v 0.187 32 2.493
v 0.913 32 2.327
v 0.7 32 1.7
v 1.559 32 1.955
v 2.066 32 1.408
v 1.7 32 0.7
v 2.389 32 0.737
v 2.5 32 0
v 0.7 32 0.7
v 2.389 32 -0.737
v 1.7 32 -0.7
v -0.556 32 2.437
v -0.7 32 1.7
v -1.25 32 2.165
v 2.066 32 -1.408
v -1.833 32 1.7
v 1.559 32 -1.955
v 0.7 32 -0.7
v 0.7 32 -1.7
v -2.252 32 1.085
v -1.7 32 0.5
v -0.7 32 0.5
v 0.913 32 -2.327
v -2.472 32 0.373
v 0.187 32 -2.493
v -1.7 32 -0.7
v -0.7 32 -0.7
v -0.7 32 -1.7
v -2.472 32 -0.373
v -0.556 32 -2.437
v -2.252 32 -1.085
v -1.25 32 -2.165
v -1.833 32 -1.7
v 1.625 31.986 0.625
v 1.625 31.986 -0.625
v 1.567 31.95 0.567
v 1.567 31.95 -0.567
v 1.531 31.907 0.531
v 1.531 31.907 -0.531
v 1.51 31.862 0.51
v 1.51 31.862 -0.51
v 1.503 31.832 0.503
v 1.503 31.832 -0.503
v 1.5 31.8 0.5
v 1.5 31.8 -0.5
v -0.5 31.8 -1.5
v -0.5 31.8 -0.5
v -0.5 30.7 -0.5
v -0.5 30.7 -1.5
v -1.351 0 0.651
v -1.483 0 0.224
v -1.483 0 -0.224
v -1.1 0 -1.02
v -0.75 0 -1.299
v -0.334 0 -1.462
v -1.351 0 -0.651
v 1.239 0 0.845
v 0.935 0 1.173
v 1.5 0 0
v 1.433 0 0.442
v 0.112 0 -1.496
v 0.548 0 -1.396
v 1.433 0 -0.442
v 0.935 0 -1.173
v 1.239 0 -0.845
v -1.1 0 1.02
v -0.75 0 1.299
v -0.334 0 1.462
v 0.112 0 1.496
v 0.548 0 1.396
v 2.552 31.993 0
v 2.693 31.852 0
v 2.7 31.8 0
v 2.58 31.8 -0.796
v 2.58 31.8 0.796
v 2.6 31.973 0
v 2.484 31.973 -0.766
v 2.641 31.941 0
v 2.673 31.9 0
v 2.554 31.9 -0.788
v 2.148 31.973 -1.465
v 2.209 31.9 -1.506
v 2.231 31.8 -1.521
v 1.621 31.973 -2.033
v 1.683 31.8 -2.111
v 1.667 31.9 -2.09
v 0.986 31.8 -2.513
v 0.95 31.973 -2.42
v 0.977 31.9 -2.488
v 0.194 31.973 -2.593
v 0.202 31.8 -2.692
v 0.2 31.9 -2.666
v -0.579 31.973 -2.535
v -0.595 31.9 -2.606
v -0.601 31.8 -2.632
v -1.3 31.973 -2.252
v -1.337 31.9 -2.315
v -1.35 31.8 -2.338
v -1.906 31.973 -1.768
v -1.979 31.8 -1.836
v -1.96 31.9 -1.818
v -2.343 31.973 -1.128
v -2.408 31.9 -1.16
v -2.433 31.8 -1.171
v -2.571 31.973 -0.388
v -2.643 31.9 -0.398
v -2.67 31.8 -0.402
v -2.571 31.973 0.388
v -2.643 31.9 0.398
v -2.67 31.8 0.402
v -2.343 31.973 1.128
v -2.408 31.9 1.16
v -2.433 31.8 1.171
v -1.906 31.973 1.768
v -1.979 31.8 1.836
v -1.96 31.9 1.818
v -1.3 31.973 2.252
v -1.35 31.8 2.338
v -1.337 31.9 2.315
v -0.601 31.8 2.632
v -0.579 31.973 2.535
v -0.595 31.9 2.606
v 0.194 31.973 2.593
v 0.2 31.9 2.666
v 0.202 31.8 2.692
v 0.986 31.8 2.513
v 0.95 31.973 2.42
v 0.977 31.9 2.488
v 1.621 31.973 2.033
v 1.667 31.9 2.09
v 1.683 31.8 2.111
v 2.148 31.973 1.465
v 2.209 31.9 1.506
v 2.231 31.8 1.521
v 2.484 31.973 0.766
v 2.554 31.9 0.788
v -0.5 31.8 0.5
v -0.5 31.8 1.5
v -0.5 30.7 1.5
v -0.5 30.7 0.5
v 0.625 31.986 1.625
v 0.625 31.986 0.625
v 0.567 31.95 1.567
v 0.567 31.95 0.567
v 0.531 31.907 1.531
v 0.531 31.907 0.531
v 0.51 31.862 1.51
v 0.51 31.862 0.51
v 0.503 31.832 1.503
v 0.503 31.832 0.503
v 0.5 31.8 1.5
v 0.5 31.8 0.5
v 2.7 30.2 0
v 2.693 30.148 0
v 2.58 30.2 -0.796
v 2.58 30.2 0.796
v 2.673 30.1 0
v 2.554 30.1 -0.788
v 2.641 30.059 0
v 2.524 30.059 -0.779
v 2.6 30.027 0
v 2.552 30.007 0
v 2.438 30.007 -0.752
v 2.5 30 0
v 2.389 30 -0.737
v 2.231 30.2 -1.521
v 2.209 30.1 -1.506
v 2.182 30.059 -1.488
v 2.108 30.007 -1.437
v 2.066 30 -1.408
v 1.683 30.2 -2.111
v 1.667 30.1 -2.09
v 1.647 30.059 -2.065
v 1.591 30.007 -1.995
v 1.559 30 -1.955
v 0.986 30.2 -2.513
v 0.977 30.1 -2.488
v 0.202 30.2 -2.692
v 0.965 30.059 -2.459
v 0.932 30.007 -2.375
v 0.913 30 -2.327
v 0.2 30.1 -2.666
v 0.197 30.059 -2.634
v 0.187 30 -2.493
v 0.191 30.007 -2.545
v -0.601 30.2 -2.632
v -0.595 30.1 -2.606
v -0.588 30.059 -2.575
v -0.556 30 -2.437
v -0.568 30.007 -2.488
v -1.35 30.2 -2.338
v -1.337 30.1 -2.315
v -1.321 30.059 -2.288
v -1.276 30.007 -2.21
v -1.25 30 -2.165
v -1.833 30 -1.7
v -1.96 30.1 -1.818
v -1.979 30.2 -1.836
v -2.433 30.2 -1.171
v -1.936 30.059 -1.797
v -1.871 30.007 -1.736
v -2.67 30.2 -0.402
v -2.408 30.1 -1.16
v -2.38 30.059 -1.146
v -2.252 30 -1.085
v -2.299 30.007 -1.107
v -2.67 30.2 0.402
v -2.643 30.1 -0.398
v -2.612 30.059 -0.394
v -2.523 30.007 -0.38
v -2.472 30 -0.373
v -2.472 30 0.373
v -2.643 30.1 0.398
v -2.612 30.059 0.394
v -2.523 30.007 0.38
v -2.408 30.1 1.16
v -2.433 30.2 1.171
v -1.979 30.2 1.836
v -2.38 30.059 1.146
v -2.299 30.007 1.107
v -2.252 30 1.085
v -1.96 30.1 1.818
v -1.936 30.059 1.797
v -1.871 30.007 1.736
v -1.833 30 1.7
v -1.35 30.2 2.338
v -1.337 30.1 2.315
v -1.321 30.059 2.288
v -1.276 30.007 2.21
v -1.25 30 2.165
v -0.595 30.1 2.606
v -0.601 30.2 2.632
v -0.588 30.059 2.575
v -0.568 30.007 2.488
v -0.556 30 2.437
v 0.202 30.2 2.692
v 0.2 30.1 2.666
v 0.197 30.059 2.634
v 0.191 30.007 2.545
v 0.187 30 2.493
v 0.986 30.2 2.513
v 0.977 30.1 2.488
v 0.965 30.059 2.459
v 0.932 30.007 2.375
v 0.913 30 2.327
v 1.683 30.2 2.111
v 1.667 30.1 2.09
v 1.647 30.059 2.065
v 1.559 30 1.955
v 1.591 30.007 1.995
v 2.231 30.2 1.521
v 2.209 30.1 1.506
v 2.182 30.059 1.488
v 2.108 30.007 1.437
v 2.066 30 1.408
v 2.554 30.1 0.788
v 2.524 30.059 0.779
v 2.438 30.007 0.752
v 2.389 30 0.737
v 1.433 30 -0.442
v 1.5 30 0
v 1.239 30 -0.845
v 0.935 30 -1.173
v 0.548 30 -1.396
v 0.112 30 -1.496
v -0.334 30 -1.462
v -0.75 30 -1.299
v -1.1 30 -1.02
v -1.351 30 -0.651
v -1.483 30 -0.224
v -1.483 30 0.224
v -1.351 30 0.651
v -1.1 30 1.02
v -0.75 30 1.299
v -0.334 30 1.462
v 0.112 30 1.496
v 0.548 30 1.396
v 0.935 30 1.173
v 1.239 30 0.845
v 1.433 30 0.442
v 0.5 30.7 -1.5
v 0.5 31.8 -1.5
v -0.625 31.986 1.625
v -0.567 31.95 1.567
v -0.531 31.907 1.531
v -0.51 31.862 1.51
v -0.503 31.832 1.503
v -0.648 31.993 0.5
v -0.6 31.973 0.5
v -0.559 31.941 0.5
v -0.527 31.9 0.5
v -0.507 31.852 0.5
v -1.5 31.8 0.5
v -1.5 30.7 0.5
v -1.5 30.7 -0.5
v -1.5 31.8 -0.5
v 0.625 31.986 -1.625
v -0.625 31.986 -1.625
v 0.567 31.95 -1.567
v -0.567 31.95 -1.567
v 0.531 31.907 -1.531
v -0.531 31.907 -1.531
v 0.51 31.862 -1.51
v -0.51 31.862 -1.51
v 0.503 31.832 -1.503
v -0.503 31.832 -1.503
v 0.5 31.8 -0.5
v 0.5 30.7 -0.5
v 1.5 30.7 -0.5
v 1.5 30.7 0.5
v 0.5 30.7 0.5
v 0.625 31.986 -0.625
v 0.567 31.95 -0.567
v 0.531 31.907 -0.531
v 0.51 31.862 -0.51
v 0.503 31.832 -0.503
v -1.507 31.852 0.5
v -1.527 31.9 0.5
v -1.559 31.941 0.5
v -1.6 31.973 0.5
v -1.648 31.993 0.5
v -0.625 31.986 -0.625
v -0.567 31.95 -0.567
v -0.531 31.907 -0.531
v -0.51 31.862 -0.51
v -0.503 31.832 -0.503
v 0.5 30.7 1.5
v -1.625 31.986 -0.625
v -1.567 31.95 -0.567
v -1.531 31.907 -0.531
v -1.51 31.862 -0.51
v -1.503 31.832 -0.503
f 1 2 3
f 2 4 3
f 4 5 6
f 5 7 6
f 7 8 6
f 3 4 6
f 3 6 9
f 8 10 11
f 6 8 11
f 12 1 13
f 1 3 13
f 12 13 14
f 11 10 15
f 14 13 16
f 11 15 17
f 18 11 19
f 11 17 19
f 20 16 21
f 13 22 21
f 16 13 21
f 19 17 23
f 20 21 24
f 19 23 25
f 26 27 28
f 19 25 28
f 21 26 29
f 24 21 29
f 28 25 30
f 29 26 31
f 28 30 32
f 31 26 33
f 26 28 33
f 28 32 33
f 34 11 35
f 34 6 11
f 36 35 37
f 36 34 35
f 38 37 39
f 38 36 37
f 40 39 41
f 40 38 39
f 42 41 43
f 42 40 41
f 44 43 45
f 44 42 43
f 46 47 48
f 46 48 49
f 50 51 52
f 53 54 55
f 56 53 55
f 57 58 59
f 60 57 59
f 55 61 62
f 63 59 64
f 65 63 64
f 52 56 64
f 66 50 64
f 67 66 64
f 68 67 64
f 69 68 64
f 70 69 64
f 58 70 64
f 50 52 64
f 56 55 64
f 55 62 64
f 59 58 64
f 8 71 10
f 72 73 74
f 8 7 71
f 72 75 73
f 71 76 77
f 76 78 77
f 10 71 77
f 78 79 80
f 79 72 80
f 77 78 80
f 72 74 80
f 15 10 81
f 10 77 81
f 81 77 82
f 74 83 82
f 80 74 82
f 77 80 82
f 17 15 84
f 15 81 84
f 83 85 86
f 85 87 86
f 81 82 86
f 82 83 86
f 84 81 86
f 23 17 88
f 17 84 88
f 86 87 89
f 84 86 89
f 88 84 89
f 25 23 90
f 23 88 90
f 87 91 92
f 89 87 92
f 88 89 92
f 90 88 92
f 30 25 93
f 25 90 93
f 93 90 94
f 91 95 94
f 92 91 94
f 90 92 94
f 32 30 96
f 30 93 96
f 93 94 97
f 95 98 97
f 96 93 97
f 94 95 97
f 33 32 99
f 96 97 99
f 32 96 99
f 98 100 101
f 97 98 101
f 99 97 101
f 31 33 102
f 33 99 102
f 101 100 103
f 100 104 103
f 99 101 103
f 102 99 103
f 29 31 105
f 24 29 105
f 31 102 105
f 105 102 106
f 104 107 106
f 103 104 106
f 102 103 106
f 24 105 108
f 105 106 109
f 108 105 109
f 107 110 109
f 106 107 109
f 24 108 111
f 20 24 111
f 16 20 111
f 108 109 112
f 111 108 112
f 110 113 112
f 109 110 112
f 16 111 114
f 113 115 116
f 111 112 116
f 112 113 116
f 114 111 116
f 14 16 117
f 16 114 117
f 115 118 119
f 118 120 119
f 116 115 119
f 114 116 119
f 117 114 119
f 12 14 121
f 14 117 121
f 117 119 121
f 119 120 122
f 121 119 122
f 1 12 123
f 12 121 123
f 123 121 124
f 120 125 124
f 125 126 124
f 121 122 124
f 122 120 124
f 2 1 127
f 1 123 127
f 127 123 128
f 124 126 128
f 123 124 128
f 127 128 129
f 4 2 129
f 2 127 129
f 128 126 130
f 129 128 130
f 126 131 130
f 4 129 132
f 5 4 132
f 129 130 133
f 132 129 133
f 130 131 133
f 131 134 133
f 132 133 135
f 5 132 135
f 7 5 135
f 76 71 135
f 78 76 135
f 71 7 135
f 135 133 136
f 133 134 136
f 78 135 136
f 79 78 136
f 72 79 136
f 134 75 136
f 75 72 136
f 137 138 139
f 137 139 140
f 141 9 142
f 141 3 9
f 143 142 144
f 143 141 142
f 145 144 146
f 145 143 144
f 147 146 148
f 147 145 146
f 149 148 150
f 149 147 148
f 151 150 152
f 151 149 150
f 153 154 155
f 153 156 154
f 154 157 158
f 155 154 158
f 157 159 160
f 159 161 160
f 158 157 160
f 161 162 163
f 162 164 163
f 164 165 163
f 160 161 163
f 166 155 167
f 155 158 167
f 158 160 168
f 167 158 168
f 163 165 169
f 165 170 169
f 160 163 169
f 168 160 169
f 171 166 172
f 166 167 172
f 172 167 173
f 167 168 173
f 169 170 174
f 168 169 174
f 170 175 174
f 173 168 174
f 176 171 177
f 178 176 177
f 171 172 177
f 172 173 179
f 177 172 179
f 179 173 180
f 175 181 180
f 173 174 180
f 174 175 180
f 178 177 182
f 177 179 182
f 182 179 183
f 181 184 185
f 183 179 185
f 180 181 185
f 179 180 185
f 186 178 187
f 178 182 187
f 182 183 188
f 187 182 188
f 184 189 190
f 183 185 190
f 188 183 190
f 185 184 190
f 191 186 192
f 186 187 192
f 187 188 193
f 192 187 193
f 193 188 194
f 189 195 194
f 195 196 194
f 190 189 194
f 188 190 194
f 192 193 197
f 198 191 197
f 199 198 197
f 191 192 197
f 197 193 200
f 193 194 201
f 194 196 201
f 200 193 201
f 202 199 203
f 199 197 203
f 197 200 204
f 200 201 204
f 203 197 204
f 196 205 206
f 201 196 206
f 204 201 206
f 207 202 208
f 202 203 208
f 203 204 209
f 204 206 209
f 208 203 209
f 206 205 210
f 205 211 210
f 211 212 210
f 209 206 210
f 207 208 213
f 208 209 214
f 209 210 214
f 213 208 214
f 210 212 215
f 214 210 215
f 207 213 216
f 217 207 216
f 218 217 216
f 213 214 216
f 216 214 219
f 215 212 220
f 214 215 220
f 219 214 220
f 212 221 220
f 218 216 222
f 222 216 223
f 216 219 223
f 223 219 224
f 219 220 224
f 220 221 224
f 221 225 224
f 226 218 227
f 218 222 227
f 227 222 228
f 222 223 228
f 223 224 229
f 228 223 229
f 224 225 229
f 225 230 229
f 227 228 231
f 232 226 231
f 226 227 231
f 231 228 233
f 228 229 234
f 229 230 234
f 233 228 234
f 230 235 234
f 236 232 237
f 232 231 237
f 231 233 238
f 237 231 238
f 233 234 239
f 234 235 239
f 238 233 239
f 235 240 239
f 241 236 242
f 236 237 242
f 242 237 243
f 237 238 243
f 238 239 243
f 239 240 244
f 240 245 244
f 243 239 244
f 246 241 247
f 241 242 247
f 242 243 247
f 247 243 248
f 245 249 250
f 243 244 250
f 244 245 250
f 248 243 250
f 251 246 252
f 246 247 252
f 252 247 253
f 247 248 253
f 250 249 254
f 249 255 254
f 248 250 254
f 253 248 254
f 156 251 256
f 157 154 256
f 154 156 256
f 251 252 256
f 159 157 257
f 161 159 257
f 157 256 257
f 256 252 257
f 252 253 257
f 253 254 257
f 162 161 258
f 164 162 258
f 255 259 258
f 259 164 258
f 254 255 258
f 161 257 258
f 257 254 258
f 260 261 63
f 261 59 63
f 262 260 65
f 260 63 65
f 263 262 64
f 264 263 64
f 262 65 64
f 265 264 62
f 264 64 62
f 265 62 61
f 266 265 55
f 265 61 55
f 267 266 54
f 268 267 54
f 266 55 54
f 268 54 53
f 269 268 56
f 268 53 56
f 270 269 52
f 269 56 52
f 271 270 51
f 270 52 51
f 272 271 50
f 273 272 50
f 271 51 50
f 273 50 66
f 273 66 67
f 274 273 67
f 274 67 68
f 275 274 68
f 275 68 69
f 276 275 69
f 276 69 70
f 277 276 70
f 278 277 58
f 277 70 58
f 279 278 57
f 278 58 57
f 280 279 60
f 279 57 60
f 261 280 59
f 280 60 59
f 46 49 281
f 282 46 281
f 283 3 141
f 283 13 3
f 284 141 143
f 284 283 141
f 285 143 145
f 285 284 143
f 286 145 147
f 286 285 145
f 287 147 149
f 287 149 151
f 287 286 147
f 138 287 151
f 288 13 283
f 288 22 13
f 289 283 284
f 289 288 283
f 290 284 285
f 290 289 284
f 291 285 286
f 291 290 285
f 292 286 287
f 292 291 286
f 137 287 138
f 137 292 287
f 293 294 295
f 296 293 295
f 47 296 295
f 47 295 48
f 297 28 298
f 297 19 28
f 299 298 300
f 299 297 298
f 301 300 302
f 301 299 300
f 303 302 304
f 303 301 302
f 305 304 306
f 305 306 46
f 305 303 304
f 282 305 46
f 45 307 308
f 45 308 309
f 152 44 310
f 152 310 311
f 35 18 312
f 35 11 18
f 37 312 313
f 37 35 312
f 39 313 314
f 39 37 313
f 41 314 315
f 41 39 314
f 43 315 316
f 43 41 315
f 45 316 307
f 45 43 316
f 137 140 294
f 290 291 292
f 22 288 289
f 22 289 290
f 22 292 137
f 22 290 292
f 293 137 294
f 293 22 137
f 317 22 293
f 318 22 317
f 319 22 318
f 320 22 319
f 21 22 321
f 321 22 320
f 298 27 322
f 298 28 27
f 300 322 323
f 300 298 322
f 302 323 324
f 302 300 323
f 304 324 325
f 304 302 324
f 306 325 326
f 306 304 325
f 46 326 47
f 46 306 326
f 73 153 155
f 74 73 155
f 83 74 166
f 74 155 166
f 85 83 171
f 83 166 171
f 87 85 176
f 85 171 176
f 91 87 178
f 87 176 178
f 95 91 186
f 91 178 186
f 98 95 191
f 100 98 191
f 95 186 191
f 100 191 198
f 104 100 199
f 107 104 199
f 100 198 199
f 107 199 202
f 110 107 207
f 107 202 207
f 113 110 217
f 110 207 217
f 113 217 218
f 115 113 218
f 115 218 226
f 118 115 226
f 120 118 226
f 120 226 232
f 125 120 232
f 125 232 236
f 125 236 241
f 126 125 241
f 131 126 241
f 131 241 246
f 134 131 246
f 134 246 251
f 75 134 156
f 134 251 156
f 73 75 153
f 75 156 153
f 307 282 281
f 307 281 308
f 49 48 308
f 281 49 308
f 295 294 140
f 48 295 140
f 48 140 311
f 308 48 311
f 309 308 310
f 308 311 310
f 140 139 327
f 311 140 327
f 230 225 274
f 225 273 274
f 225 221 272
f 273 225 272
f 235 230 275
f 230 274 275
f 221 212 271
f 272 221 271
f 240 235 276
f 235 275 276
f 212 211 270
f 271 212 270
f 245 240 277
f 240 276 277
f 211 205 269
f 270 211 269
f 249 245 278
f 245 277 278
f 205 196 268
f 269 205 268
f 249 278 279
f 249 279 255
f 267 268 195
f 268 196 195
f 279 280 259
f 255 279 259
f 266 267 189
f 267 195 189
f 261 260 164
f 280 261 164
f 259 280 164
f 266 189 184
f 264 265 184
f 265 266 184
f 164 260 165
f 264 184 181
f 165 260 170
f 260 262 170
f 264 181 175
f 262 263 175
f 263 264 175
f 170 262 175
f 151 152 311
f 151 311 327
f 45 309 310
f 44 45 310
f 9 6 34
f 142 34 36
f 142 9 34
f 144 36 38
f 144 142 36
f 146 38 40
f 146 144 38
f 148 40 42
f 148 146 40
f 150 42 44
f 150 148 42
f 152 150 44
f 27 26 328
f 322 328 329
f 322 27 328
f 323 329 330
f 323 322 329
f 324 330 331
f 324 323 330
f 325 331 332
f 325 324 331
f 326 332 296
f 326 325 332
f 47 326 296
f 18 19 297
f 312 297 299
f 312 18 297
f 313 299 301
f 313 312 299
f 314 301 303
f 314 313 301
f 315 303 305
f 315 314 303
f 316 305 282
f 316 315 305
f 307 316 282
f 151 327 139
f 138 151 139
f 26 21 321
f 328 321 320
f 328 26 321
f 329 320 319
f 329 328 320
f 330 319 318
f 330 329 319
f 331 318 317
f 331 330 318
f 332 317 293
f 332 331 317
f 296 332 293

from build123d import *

# Parameters (mm, degrees)
FILLET_R     = 0.2
POCKET_DEPTH = 1.3
FILLET001_R  = 0.2


with BuildPart() as part:
    # Sketch → Revolution (revolve)
    with BuildSketch(Plane.XY):
        Polygon((0, 0), (0, 32), (2.7, 32), (2.7, 30), (1.5, 30), (1.5, 0), align=None)
    revolve(axis=Axis((0, 0, 0), (0, 1, 0)))

    # Fillet
    fillet_edges = [part.edges().sort_by_distance(p)[0] for p in [
        (-2.7, 30, 0),
        (-2.7, 32, 0),
    ]]
    fillet(fillet_edges, radius=FILLET_R)

    # Sketch001 (on Face1 of Fillet) → Pocket (cut)
    with BuildSketch(Plane(origin=(0, 32, 0), x_dir=(-1, 0, 0), z_dir=(0, 1, 0))):
        Polygon((0.5, 1.5), (0.5, 0.5), (1.5, 0.5), (1.5, -0.5), (0.5, -0.5), (0.5, -1.5), (-0.5, -1.5), (-0.5, -0.5), (-1.5, -0.5), (-1.5, 0.5), (-0.5, 0.5), (-0.5, 1.5), align=None)
    extrude(amount=-POCKET_DEPTH, mode=Mode.SUBTRACT)

    # Fillet001
    fillet001_edges = [part.edges().sort_by_distance(p)[0] for p in [
        (0, 32, -1.5),
        (0.5, 32, -1),
        (1, 32, -0.5),
        (1.5, 32, 0),
        (1, 32, 0.5),
        (0.5, 32, 1),
        (-0.5, 32, 1),
        (0, 32, 1.5),
        (-1.5, 32, 0),
        (-1, 32, -0.5),
        (-0.5, 32, -1),
    ]]
    fillet(fillet001_edges, radius=FILLET001_R)


solid = part.part
